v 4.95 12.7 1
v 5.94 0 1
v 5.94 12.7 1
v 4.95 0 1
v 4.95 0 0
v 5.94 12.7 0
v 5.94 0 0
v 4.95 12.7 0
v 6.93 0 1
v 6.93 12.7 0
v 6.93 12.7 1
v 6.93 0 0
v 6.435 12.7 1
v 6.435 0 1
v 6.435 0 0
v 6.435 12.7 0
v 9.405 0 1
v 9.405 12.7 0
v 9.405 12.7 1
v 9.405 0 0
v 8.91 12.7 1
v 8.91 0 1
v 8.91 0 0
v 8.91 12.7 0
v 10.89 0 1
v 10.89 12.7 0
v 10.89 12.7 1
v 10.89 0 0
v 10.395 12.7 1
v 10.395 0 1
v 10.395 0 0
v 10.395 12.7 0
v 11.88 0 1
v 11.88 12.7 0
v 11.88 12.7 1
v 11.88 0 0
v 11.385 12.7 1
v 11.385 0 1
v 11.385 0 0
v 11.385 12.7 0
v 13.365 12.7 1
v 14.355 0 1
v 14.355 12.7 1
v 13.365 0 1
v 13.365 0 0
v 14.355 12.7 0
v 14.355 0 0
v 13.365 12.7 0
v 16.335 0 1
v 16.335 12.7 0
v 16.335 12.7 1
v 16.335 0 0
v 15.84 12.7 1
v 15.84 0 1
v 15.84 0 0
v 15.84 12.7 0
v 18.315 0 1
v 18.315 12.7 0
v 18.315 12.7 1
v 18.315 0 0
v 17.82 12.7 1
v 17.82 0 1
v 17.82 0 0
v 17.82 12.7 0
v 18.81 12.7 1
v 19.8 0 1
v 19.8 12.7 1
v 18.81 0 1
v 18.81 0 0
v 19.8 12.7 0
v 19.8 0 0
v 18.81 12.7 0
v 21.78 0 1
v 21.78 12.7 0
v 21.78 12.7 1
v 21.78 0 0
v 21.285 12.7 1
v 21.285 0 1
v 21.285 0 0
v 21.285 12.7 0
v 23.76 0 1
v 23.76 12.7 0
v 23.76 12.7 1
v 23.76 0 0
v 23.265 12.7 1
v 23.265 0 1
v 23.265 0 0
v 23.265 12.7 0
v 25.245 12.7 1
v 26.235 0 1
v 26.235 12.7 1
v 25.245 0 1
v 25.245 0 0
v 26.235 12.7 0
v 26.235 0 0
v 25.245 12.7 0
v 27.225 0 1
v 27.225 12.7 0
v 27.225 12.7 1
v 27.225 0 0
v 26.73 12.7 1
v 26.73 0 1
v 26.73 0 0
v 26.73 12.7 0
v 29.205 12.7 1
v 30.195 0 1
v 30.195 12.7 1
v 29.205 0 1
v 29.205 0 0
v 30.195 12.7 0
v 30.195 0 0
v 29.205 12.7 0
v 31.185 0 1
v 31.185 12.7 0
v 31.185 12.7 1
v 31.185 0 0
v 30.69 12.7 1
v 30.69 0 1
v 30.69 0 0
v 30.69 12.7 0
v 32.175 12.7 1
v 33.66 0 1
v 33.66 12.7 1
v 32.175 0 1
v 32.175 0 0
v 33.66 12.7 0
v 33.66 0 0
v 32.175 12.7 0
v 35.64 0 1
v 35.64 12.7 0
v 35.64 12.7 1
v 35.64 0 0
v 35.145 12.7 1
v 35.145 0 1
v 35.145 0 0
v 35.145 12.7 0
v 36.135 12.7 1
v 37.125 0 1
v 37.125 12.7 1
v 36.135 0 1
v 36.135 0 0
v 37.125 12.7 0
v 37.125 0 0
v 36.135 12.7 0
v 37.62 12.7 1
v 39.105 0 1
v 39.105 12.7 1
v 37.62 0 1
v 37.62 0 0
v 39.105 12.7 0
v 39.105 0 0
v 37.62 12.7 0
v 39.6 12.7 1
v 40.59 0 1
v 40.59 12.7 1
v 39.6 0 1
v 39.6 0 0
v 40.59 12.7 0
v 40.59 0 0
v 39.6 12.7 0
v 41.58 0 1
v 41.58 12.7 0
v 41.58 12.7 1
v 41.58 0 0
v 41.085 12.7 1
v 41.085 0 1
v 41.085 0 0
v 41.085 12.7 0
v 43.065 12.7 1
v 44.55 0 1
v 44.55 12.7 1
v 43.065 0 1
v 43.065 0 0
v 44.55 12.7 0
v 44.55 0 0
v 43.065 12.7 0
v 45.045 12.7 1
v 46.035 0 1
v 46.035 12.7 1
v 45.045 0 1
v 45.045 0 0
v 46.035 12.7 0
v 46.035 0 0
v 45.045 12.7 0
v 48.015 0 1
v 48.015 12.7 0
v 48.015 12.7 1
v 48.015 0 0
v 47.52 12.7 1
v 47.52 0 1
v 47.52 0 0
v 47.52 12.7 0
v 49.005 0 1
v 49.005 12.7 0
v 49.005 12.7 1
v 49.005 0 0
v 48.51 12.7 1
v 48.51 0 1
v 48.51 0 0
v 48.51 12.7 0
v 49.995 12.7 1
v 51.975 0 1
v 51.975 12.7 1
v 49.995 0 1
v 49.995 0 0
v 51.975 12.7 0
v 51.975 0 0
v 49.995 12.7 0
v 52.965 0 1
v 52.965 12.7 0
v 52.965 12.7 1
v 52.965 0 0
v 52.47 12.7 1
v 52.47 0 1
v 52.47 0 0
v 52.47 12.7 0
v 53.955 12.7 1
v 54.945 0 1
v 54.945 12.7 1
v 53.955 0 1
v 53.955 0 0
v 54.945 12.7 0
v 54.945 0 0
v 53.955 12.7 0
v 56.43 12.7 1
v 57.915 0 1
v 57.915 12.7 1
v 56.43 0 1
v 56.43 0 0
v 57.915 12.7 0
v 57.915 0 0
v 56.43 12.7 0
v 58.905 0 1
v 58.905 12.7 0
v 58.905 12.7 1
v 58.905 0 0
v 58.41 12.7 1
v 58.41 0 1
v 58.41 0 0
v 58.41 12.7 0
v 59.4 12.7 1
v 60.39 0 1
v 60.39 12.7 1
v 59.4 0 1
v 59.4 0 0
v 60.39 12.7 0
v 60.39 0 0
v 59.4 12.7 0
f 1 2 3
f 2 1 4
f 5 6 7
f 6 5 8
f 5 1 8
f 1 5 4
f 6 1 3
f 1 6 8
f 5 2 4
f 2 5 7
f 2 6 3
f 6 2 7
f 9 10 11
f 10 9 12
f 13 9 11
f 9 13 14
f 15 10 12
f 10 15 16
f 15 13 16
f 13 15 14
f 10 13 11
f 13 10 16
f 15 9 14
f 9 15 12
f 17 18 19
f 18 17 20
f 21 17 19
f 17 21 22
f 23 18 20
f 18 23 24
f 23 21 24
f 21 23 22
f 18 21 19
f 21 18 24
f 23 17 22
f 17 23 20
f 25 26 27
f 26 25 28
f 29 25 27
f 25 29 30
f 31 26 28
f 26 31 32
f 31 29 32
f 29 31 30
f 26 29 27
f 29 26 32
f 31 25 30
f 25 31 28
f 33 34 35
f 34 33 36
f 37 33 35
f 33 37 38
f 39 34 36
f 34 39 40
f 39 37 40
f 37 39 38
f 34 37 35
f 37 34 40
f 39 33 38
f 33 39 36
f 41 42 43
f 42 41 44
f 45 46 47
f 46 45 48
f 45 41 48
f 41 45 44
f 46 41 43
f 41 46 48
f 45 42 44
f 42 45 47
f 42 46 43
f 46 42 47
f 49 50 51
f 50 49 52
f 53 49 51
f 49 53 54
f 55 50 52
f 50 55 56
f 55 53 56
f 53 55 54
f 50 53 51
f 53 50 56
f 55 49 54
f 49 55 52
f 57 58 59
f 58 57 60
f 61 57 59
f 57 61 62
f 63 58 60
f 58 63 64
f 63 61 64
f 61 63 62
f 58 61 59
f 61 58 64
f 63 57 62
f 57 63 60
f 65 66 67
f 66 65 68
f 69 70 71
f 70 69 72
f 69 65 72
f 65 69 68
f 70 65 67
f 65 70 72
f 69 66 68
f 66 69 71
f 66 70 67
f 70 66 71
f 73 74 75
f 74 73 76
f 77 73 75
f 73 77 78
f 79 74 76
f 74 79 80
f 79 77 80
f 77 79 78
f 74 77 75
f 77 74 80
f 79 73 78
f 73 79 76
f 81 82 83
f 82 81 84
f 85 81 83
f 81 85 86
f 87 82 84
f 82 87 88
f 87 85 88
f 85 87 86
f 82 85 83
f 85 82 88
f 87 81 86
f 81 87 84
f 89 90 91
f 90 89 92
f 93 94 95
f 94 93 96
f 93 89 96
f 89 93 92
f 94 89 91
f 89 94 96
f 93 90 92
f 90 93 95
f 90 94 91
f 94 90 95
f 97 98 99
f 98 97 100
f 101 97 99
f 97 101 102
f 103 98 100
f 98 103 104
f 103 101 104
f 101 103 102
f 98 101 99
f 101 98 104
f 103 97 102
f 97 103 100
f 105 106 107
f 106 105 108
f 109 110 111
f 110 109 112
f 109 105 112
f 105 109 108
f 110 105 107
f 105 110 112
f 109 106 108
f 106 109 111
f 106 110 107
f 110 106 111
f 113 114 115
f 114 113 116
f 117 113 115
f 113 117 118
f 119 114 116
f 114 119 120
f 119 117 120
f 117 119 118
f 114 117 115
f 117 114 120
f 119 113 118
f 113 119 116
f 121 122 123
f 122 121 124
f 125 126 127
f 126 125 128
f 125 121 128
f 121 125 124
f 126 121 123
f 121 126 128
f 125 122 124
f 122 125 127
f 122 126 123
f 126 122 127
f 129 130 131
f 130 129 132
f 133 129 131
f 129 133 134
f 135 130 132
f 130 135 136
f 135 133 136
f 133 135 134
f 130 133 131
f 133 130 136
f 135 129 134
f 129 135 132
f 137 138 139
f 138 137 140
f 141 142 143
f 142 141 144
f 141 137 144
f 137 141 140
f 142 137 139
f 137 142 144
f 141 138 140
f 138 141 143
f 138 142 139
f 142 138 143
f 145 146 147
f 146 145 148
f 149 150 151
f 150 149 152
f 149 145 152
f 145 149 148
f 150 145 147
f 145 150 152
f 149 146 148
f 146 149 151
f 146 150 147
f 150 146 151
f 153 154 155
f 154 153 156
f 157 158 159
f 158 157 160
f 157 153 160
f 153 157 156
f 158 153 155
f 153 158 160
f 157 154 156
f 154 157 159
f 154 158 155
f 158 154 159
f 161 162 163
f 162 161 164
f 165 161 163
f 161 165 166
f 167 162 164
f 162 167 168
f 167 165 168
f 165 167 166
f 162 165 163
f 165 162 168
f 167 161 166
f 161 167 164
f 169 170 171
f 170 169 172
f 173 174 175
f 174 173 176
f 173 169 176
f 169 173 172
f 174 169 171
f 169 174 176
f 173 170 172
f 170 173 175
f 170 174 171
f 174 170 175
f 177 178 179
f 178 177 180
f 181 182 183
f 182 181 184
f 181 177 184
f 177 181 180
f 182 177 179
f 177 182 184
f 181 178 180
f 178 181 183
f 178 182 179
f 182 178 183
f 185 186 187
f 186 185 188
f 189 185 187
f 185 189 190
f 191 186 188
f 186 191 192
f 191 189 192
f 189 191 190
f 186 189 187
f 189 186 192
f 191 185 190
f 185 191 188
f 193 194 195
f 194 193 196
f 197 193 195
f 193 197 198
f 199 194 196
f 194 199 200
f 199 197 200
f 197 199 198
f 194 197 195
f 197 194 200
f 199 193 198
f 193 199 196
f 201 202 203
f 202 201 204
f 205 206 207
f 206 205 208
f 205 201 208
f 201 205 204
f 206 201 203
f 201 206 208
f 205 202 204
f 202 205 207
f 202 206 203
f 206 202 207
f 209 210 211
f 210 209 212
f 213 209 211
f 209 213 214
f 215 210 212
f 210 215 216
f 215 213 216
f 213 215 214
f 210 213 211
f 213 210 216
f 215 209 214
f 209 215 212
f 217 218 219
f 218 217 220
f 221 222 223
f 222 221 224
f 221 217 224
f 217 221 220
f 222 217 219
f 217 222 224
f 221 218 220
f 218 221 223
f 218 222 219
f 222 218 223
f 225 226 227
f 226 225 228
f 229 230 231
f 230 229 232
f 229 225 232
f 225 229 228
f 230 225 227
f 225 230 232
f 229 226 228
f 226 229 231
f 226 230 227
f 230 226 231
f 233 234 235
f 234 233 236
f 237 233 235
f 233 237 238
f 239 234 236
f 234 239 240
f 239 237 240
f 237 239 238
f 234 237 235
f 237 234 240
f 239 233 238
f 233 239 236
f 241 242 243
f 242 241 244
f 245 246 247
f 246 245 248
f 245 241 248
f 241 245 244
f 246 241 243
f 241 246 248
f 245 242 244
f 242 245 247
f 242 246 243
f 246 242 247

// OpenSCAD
// file: ../../util/bitmap.scad
/*****************************************************************************
 * Module Bitmap Library
 * Modules to create bitmaps of unit squares from 1 or 2 dimensional vectors.
 *****************************************************************************
 * Copyright 2017 Chris Baker
 *
 * This program is free software: you can redistribute it and/or modify
 * it under the terms of the GNU Lesser General Public License as published by
 * the Free Software Foundation, either version 3 of the License, or
 * (at your option) any later version.
 *
 * This program is distributed in the hope that it will be useful,
 * but WITHOUT ANY WARRANTY; without even the implied warranty of
 * MERCHANTABILITY or FITNESS FOR A PARTICULAR PURPOSE.  See the
 * GNU Lesser General Public License for more details.
 *
 * You should have received a copy of the GNU Lesser General Public License
 * along with this program.  If not, see <http://www.gnu.org/licenses/>.
 *****************************************************************************
 * Usage:
 * Include this file with the "use" tag.
 * Depends on compat.scad library.
 *
 * API:
 *   1dbitmap(bitmap, center, expansion, vector_mode)
 *   2dbitmap(bitmap, center, expansion, vector_mode)
 *     Generate a 1 or 2-Dimensional field of modules based on the provided
 *     bitmap vector. See Bitmap Vectors below.
 *     The center flag determines whether to center the bitmap on the origin.
 *     The expansion value actually shrinks each cube in the x and y
 *     dimension by the specified amount.
 *     The vector_mode flag determines whether to create 3D solid geometry
 *     (unit cubes) or 2D vector geometry (squares).
 *
 * Bitmap Vectors:
 *   The bitmap vectors primarily provide boolean information.
 *   A module will be placed where these vectors have a postive value and
 *   skipped where they have a negative value. I.E. 0, -1, false, and undef
 *   are all equivalent and result in a skip. 1 and true are equivalent and
 *   result in a placed 1-unit module.
 *   Further, if the value is an integer it will be treated as a height for
 *   the module, allowing z-maps to be created.
 *   If the value is not an integer or boolean, it will be treated as a color
 *   reference. This can be a string or RGBA vector that will be used to
 *   color the module in the OpenSCAD preview window.
 *   In current versions of OpenSCAD, the color has no effect in the rendered
 *   view or STL output.
 *
 * Vector Mode:
 *   Although OpenSCAD supports generating 2D geometry, there are several
 *   caveats:
 *   - 2D and 3D geometry cannot be mixed
 *   - Extruding 2D geometry causes color information to be lost
 *   - All 2D geometry is projected onto the XY plane when rendering
 *   - Rendering also results in loss of color (same as 3D)
 *   - The SVG exporter is somewhat limited:
 *     - The pixel size of the image is hard-coded in the file
 *     - The title of the image is a generic string
 *     - The color selection for stroke and fill is fixed
 *     - The stroke-width is set to a large value that will cause overlap
 *     - The background is transparent
 *     - Only one path element is created with all of the geometry; there is
 *       no easy way to split up the geometry into multiple logical units.
 *     - These issues can mostly be resolved by hand-editing the file:
 *       - Remove or modify the width and height parameters from the svg
 *         element at the top of the file to provide better scaling.
 *       - Edit the title element at the top of the file to change the title.
 *       - Edit the stroke and fill parameters of the path element (these will
 *         probably be at the end of the file).
 *       - Set the stroke-width parameter for the path element to 0.
 *****************************************************************************/
use <compat.scad>

/*
 * 2dbitmap - Turn a 2D vector into a bitmap of cubes
 *
 * bitmap - 2D vector representing where to place each cube
 *          Value can either be boolean, z-height, or color
 * center - center cubes around the origin
 * expansion - size of gap around each pixel (screendoor)
 * vector_mode - create a 2D vector drawing instead of 3D extrusion
 */
module 2dbitmap(bitmap=[[1,0],[0,1]], center=false, expansion=0, vector_mode=false)
{
	ylen=len(bitmap)-1;

	for (y=[0:ylen]) {
		xlen=len(bitmap[y])-1;
		for (x=[0:xlen])
			translate([x-(center?xlen/2:0),ylen-y-(center?ylen/2:0),0])
				if (is_indexable(bitmap[y][x]))
					color(bitmap[y][x])
						if (vector_mode)
							square([1-expansion,1-expansion], center=center);
						else
							cube([1-expansion,1-expansion,1], center=center);
				else
					if (bitmap[y][x])
						if (vector_mode)
							square([1-expansion,1-expansion], center=center);
						else
							cube([1-expansion,1-expansion,clamp_nonnum(bitmap[y][x])], center=center);
	}
}

module 1dbitmap(bitmap=[1,0,1,0,1], center=false, expansion=0, vector_mode=false)
	2dbitmap([bitmap], center, expansion, vector_mode);

/*
 * Examples
 */

// 1D with z-height
translate([10,0,0]) scale([1,10,1])
	1dbitmap(bitmap=[1,1,0,2,0,0,3], expansion=.1);

// 1D with boolean
translate([-20,0,0]) scale([1,10,1])
	1dbitmap(bitmap=[true,false,true,false,true,true]);

// 2D with z-height
scale([2,2,1])
	2dbitmap(bitmap=[[1,0,2,1],[0,3,3,0],[1,1,0,1]],
		center=true);

// 1D with color
translate([0,-10,0]) scale([1,3,1])
	1dbitmap(bitmap=["red","white","blue",[0,0.3,0,0.5]]);

// 1D with color using 2D-vector-mode
translate([-7,-8,0]) scale([1,2])
	1dbitmap(bitmap=["red",0,"blue",0,"green"], vector_mode=true);
translate([-4.5,-10,0]) scale([1,2])
	1dbitmap(bitmap=["red",0,"blue",0,"green"], vector_mode=true, center=true);
// main file
/* Unit Test 01: 128A */
use <../code128.scad>

code_128(cs128_a("ABC\tXYZ"), bar="black");
